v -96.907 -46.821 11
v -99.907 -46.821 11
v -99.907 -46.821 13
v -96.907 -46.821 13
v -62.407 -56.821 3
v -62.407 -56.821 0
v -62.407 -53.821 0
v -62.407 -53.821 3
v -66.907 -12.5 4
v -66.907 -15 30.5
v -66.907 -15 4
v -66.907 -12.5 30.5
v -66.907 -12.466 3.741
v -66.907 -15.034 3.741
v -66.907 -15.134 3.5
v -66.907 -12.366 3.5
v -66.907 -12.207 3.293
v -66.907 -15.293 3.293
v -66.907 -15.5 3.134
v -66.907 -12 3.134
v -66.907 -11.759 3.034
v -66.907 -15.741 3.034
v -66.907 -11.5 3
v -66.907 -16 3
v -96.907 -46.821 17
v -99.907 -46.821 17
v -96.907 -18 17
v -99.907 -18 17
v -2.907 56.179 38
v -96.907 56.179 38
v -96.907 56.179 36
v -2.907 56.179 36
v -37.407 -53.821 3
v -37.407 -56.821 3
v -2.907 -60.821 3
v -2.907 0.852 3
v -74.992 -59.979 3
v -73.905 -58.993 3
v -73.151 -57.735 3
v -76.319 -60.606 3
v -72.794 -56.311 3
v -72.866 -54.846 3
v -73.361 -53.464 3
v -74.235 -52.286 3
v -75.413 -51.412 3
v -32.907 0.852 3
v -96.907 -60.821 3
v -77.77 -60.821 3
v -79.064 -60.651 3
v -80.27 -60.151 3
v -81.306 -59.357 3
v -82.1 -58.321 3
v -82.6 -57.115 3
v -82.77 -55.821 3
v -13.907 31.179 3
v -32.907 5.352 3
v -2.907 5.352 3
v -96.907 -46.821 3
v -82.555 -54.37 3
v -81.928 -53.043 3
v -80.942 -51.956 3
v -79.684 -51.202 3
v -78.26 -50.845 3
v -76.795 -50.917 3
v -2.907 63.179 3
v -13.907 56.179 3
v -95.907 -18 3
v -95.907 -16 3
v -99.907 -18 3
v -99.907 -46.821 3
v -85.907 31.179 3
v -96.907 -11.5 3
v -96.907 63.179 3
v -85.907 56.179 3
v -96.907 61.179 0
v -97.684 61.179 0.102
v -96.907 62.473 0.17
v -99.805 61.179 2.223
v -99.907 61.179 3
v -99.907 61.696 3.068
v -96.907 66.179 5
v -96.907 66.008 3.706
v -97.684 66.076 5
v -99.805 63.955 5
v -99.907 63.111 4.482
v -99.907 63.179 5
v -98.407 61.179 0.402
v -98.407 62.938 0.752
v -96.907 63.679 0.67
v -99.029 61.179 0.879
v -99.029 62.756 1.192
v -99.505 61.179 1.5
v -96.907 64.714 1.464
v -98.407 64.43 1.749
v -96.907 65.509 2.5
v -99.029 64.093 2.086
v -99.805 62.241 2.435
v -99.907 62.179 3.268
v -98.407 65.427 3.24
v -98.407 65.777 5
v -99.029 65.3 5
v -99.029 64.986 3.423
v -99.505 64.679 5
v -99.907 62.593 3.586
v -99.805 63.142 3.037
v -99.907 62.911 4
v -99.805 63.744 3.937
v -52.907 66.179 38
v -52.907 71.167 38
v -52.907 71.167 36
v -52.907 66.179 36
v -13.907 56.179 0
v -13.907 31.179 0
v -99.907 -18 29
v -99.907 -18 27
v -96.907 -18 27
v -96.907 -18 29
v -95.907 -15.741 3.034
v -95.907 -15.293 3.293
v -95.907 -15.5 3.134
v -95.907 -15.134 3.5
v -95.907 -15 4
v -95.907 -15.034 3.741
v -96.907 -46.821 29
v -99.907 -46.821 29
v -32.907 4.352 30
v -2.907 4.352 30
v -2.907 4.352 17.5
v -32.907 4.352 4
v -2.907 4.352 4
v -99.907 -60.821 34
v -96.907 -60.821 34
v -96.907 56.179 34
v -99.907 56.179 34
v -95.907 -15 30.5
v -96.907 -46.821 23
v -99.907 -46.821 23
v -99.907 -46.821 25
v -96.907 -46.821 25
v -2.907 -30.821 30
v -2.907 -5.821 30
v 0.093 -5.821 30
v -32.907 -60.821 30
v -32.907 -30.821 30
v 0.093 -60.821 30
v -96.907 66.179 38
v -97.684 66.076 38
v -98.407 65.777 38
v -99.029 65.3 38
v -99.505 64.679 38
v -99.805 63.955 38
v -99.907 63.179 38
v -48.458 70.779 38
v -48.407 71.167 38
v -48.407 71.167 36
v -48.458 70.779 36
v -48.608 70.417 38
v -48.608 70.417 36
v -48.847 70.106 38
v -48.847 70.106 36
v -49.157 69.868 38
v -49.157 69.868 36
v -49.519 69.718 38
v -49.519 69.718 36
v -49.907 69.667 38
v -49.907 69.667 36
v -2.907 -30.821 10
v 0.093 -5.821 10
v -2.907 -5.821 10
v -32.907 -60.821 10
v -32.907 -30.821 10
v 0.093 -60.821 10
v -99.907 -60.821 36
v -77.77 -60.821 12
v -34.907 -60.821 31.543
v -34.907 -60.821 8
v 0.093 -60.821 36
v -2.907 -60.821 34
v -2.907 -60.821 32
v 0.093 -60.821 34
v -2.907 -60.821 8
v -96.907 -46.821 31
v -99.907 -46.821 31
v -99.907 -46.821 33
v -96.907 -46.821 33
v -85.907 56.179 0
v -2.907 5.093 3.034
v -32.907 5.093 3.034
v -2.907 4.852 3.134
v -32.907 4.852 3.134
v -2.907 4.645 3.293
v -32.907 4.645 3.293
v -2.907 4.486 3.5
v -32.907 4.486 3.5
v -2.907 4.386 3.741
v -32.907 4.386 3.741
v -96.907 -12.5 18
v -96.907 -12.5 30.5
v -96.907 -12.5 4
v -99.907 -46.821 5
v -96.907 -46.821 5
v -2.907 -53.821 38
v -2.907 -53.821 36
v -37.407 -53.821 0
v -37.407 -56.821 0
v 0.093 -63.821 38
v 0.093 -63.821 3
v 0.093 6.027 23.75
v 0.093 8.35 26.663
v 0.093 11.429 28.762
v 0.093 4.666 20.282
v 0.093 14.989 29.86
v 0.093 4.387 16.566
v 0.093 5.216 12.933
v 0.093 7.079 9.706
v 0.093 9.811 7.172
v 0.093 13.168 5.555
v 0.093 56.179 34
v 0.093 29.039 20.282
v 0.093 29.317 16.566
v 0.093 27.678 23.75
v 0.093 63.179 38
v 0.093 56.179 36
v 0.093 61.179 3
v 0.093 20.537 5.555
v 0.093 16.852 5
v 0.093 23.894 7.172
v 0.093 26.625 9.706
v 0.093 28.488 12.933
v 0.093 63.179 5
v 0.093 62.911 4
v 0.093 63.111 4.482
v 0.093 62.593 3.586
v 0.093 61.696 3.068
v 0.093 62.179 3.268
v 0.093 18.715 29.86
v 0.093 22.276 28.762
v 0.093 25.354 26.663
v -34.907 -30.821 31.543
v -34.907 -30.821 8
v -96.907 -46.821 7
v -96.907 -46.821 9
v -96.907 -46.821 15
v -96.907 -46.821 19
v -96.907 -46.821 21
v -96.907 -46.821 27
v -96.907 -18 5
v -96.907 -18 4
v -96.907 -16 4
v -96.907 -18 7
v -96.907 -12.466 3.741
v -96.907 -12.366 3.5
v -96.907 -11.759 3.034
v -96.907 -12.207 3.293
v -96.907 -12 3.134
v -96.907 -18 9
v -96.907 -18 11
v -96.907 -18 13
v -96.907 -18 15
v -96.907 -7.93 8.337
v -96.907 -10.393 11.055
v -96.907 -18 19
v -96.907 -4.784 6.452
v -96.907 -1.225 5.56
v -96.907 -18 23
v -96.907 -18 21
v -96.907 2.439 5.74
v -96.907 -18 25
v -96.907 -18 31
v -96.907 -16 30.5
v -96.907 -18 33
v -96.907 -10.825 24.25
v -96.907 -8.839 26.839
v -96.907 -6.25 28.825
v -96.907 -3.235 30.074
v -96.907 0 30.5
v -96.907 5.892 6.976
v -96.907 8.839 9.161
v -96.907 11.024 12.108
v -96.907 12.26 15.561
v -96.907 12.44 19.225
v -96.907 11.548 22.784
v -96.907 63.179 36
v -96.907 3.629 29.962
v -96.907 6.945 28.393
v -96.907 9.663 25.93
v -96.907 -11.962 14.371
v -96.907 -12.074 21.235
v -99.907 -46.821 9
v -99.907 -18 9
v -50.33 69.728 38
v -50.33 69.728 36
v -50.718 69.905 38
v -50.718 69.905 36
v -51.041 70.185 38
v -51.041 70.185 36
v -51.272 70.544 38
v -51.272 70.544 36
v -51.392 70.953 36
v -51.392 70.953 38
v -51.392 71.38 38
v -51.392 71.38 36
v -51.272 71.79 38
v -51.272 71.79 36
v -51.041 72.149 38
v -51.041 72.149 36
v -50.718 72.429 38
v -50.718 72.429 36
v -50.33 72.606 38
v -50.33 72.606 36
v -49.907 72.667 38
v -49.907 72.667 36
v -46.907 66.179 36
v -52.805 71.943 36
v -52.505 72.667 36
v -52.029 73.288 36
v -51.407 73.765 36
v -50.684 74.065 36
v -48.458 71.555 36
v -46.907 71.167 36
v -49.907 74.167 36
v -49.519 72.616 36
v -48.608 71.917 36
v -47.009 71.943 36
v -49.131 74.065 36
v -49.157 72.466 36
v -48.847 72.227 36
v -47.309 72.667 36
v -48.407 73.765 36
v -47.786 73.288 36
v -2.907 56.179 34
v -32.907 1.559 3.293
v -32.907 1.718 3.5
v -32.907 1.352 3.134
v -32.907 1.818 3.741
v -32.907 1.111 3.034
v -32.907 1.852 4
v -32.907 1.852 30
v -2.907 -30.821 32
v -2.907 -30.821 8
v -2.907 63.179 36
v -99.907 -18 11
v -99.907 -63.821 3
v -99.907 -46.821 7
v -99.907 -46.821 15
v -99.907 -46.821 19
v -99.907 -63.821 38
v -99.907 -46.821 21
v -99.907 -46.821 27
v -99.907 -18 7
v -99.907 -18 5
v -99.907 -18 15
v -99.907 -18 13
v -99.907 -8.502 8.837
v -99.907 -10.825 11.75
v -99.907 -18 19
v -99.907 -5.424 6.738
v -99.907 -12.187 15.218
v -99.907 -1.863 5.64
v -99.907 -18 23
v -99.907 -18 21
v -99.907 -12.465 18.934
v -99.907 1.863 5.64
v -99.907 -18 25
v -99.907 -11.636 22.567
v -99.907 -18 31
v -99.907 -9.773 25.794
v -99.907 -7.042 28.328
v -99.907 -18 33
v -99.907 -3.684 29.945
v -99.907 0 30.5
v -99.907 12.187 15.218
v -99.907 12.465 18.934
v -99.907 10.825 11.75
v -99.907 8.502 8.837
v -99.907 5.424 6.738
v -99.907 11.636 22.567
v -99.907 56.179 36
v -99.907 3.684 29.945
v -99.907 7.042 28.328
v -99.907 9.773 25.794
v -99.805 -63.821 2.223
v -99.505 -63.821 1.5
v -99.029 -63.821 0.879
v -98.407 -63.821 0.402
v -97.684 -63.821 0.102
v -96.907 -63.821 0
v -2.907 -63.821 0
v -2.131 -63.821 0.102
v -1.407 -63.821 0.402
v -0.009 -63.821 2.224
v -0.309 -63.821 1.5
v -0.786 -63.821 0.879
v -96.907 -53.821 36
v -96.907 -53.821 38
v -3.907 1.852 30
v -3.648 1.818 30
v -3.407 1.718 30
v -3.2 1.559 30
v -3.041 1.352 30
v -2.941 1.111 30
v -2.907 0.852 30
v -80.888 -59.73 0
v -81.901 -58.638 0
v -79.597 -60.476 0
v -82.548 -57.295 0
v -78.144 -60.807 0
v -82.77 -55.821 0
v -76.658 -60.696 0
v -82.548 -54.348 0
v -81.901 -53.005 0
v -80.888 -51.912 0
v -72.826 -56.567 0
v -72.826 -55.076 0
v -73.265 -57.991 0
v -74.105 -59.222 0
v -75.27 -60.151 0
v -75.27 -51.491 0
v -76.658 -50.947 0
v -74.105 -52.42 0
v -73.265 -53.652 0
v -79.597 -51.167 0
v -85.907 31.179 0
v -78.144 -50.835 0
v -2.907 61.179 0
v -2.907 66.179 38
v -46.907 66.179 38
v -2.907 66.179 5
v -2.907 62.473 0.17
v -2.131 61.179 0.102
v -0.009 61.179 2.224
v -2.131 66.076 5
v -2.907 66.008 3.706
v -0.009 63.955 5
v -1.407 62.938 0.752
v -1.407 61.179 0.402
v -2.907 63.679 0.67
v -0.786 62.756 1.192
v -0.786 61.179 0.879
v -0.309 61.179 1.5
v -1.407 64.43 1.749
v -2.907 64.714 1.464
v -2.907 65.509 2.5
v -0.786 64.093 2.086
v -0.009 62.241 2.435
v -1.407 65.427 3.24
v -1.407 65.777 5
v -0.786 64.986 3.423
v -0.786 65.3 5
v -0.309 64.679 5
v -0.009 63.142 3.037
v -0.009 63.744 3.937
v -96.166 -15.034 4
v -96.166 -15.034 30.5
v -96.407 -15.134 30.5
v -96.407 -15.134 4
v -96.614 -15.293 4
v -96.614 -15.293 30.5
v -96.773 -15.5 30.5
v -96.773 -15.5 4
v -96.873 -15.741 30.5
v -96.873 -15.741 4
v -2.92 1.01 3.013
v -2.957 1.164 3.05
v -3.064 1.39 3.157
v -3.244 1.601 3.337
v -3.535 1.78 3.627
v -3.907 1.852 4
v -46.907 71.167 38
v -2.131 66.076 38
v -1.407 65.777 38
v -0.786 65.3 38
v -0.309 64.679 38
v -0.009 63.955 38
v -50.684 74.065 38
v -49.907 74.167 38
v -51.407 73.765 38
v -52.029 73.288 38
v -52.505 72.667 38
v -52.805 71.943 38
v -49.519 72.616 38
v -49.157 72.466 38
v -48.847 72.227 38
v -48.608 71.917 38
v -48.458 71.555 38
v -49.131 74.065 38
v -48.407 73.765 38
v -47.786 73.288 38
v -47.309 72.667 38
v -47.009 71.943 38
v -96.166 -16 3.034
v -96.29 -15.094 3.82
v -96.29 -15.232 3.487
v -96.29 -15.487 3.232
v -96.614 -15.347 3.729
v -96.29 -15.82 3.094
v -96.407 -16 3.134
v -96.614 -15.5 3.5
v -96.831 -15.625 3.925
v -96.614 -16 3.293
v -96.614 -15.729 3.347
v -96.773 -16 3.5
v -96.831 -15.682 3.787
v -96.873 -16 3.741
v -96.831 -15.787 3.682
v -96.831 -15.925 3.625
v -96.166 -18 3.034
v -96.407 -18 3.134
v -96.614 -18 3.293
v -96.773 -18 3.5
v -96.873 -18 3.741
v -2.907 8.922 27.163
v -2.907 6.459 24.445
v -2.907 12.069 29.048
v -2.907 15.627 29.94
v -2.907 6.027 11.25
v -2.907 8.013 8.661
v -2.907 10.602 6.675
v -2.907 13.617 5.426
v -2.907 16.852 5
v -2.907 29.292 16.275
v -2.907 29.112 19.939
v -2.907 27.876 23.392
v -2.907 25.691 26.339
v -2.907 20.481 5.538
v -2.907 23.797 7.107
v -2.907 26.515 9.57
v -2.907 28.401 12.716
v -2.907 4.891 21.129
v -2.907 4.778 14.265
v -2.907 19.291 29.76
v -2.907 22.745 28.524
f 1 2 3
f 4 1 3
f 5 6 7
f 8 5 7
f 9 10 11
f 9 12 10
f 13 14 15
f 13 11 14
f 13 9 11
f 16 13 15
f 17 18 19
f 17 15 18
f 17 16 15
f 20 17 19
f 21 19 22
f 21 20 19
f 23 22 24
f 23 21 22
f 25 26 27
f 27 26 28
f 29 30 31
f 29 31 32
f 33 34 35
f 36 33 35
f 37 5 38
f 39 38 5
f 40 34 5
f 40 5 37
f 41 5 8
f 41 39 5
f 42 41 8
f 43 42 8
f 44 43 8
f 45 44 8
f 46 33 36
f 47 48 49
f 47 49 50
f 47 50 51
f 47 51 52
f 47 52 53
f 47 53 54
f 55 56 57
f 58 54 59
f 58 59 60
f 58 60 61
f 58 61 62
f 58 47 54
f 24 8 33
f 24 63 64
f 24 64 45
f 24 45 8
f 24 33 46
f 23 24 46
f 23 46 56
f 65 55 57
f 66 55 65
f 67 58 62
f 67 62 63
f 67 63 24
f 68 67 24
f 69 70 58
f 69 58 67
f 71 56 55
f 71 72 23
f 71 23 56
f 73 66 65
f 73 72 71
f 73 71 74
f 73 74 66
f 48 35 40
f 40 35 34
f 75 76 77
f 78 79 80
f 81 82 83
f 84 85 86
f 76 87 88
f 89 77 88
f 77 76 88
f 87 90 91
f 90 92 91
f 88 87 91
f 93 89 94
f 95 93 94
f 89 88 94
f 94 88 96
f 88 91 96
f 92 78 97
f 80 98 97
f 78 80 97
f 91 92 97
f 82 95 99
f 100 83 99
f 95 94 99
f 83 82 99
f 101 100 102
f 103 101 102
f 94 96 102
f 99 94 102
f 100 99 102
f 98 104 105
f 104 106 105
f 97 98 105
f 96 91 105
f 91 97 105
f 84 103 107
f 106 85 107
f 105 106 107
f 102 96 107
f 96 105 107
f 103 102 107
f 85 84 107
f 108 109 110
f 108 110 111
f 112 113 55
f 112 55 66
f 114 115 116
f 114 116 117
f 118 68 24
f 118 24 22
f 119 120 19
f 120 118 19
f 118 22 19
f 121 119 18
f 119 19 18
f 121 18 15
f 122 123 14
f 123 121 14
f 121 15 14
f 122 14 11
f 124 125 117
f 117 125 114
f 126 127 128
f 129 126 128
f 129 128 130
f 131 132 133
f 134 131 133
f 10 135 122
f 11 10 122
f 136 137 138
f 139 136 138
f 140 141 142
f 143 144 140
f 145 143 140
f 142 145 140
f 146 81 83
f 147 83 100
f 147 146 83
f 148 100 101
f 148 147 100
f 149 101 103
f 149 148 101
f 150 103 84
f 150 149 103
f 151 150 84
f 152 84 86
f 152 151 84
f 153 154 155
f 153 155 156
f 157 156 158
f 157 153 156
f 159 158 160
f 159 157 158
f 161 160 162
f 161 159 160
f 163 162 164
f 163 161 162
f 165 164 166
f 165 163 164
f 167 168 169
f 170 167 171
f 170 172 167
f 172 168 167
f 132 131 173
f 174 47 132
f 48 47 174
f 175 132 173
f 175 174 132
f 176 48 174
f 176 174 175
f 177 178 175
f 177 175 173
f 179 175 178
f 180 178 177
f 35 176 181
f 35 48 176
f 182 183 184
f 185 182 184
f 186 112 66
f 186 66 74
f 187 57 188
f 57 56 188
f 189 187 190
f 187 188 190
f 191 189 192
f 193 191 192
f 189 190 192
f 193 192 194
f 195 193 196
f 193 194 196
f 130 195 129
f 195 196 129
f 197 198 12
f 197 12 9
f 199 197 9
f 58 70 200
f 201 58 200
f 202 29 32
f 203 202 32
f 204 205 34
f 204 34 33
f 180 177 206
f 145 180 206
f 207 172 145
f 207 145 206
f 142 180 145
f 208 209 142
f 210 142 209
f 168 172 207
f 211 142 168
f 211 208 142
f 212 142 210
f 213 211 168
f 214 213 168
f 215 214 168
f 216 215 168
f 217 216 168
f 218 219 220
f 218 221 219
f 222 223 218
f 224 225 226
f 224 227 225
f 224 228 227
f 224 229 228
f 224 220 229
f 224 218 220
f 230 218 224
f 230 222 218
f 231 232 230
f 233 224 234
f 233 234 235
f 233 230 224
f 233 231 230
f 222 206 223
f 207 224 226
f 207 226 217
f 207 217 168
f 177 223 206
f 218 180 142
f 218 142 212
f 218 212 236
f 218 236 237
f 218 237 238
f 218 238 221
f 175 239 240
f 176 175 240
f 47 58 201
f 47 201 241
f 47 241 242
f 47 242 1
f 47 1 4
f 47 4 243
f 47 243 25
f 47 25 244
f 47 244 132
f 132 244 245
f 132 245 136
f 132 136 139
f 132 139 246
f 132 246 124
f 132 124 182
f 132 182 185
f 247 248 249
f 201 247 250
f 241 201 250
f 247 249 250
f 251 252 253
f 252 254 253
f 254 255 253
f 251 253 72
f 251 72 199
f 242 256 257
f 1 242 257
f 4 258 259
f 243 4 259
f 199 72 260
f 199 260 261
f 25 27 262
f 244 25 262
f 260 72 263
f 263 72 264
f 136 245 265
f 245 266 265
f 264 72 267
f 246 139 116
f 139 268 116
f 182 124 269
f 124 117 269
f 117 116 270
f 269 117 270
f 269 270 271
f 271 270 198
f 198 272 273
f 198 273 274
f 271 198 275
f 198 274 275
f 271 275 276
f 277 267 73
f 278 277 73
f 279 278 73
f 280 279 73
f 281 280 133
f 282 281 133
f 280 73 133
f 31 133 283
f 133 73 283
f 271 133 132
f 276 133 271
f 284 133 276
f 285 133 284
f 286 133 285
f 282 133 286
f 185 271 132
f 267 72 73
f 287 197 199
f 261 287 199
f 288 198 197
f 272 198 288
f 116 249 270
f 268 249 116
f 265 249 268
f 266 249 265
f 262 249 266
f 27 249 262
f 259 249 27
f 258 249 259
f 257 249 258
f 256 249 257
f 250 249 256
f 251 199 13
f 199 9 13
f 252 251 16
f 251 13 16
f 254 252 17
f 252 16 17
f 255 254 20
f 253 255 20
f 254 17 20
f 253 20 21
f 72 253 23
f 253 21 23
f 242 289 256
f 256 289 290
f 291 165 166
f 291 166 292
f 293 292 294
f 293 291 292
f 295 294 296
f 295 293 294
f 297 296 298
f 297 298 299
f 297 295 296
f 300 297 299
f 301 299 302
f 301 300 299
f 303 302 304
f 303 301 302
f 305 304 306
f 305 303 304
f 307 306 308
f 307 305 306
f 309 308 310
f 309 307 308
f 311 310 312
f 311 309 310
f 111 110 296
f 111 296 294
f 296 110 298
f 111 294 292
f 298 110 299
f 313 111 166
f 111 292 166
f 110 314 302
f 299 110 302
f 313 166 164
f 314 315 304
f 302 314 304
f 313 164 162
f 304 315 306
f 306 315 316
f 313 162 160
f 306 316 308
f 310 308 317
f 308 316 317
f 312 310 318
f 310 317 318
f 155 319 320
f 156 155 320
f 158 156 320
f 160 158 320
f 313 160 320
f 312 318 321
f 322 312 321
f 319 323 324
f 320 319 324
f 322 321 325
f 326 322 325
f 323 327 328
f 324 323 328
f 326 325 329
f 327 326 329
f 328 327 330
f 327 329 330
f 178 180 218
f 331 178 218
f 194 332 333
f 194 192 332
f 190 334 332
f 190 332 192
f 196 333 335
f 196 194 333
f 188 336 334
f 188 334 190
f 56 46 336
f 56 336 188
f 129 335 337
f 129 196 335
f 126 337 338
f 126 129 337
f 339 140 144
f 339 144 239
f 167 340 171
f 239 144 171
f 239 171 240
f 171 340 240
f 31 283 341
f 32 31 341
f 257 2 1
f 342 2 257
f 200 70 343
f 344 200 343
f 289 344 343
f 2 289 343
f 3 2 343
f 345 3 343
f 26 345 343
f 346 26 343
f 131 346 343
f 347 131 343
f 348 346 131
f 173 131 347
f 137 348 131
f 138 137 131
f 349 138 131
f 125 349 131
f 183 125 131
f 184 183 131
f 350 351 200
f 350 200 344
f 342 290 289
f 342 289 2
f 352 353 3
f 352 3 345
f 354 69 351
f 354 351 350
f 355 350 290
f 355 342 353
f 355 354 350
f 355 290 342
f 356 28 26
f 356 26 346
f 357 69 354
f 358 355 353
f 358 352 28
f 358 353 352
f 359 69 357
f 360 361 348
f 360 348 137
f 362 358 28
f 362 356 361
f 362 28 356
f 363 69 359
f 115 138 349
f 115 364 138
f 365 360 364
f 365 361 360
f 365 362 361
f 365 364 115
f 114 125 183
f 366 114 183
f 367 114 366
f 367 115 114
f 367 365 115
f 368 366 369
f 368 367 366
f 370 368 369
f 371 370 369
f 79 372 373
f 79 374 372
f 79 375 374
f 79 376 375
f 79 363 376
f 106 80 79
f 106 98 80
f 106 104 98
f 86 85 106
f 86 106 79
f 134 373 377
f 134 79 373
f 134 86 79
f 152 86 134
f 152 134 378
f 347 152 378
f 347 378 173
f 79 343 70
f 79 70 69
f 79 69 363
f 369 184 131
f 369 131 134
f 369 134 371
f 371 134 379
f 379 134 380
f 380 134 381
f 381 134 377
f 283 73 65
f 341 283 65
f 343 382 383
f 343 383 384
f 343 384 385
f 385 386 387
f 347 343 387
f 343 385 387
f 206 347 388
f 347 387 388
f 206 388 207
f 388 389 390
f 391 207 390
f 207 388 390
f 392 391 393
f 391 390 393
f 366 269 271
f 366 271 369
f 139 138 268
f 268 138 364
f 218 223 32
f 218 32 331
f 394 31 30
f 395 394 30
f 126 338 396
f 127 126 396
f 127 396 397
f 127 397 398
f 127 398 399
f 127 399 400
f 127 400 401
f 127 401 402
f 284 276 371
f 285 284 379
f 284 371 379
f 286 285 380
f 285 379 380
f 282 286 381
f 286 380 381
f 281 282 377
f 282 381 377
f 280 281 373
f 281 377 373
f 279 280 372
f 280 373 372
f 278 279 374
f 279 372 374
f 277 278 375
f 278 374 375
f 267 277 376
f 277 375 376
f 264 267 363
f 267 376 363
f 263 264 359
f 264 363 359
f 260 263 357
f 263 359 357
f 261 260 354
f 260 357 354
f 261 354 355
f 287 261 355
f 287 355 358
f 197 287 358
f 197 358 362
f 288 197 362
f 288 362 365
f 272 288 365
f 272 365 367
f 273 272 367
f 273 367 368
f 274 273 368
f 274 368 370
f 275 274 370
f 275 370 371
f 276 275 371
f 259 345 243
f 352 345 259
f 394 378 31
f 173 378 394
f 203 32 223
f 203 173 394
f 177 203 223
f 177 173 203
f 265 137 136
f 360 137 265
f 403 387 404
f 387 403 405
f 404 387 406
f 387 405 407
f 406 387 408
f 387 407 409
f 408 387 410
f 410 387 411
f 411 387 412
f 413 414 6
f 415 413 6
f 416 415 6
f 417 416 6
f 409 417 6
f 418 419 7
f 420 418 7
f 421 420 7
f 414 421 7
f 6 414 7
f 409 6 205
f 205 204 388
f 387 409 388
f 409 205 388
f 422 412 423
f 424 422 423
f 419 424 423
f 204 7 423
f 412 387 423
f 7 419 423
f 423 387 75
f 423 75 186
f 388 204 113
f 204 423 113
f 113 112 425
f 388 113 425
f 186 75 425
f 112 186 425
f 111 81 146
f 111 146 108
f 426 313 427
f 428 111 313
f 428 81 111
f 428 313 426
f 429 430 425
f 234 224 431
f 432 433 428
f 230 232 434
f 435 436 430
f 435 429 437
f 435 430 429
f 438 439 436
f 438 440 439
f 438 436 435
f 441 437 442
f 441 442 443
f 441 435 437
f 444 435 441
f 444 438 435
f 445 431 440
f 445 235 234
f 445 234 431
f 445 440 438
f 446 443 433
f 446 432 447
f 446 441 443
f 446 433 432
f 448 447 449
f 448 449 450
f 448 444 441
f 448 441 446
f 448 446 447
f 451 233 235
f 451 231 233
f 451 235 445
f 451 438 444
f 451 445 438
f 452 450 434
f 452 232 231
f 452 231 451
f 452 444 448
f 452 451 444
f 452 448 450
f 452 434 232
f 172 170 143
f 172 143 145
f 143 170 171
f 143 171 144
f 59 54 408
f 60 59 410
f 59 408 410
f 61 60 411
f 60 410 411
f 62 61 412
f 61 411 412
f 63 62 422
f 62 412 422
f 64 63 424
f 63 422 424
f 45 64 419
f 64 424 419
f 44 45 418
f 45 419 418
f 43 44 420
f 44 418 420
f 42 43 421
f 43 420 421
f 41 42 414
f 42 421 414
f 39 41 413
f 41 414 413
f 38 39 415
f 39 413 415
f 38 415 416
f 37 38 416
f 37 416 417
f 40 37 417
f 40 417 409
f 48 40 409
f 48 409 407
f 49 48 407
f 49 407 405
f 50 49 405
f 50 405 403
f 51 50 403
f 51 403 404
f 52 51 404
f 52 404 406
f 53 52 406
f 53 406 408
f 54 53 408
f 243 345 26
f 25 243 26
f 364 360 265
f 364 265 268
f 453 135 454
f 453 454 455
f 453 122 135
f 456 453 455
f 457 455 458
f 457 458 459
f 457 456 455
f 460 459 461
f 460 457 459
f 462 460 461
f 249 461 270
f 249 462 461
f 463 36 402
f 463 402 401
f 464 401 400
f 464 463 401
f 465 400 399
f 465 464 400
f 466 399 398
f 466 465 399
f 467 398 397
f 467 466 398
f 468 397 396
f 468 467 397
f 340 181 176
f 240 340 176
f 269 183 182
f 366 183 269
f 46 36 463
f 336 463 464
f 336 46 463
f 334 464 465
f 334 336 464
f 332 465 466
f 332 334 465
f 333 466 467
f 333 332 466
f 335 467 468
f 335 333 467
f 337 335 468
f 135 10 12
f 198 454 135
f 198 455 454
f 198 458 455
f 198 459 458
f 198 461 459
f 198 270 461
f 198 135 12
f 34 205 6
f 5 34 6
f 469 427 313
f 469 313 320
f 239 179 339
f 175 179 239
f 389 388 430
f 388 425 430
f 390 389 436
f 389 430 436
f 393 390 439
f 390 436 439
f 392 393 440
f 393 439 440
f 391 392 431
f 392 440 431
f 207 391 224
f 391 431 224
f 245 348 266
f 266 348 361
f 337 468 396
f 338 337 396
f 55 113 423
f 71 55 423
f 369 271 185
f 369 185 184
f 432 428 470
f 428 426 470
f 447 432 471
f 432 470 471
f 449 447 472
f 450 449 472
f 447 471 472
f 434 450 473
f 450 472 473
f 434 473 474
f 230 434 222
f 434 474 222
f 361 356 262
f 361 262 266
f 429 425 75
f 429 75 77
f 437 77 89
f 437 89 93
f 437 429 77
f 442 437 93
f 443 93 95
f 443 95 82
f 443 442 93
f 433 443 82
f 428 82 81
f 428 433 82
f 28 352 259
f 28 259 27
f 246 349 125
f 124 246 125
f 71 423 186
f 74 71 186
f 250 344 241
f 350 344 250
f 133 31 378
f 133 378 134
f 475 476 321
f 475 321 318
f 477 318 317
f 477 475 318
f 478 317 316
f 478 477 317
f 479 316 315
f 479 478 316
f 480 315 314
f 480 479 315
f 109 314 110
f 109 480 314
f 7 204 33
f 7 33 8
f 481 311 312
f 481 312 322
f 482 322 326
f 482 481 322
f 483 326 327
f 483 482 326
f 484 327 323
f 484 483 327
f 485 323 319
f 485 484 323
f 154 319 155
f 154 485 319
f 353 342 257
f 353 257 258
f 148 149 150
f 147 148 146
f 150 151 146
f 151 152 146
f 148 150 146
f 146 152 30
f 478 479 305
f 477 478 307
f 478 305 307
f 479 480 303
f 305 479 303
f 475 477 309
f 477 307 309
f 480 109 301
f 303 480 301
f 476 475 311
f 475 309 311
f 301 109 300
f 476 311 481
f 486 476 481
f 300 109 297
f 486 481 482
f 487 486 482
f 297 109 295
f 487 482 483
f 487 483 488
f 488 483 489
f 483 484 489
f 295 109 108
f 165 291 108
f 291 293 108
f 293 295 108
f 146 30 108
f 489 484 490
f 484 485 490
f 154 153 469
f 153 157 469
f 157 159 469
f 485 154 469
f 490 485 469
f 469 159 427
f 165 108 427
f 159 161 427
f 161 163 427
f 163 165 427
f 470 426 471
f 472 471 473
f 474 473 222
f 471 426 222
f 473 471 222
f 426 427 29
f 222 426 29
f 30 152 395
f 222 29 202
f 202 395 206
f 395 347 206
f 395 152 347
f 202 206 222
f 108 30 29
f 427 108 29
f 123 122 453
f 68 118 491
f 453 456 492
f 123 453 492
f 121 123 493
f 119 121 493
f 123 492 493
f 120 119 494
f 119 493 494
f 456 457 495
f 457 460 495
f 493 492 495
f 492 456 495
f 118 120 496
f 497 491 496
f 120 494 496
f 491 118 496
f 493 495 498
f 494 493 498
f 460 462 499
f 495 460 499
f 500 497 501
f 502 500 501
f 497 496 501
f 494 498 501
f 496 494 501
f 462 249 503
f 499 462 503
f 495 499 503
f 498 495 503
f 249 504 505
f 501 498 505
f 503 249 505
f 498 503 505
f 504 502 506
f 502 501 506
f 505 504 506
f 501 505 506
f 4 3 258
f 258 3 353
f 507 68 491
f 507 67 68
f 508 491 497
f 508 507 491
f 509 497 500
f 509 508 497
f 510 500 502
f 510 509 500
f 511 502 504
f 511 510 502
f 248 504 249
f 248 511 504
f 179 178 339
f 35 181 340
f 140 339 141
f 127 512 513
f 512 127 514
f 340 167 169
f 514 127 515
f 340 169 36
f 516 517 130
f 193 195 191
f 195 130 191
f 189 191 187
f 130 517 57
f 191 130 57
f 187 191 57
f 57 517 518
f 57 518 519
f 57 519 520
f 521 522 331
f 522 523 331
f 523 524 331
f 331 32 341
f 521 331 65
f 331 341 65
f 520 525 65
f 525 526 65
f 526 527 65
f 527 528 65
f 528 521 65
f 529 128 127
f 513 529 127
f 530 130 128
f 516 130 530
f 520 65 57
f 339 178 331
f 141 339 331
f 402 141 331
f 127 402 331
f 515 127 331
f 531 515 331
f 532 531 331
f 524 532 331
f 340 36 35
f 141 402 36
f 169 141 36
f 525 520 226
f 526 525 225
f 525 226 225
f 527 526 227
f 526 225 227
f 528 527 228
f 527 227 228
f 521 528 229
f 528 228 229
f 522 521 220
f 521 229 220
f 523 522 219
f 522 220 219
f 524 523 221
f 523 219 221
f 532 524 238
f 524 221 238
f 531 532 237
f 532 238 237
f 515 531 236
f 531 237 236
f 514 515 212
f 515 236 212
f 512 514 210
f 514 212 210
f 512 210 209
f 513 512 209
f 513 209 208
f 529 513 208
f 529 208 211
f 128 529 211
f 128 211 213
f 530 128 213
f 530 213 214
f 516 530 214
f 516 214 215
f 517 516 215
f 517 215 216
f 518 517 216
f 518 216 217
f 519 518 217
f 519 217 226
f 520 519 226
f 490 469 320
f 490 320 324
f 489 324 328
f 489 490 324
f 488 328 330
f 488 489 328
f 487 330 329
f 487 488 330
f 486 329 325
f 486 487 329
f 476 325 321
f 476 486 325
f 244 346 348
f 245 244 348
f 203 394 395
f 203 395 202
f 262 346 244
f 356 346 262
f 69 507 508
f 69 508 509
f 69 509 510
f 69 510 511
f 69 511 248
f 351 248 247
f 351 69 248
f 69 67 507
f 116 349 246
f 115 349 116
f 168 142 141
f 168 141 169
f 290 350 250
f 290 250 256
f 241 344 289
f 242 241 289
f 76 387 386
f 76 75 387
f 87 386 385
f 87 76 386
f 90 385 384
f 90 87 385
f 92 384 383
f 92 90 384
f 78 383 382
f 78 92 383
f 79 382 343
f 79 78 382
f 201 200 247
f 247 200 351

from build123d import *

# Parameters (mm, degrees)
IZIM1_W                      = 100
IZIM1_H                      = 130
Y_KSEKLIK_EKSTR_ZYON1_DEPTH  = 35
IZIM2_W                      = 94
IZIM2_H                      = 124
KES_EKSTR_ZYON1_DEPTH        = 27
IZIM3_W                      = 72
IZIM3_H                      = 25
KES_EKSTR_ZYON2_DEPTH        = 27
IZIM4_W                      = 25
IZIM4_H                      = 3
KES_EKSTR_ZYON3_DEPTH        = 27
IZIM7_W                      = 20
IZIM7_H                      = 55
KES_EKSTR_ZYON5_DEPTH        = 27
IZIM8_R                      = 12.5
KES_EKSTR_ZYON7_DEPTH        = 27
IZIM9_R                      = 12.5
KES_EKSTR_ZYON8_DEPTH        = 27
IZIM12_W                     = 94
IZIM12_H                     = 124
KES_EKSTR_ZYON9_DEPTH        = 5
IZIM13_W                     = 28.453191741
IZIM13_H                     = 38.236186197
Y_KSEKLIK_EKSTR_ZYON2_DEPTH  = 3
IZIM14_R                     = 12.5
KES_EKSTR_ZYON10_DEPTH       = 12
IZIM15_R                     = 5
KES_EKSTR_ZYON12_DEPTH       = 12
IZIM16_W                     = 29
IZIM16_H                     = 28.82133995
KES_EKSTR_ZYON13_DEPTH       = 12
IZIM17_W                     = 2
IZIM17_H                     = 28.82133995
Y_KSEKLIK_EKSTR_ZYON3_DEPTH  = 3
IZIM18_W                     = 3
IZIM18_H                     = 28.82133995
KES_EKSTR_ZYON14_DEPTH       = 1
IZIM20_W                     = 3
IZIM20_H                     = 130
Y_KSEKLIK_EKSTR_ZYON4_DEPTH  = 3
IZIM21_W                     = 3
IZIM21_H                     = 130
Y_KSEKLIK_EKSTR_ZYON5_DEPTH  = 3
IZIM22_W                     = 94
IZIM22_H                     = 3
Y_KSEKLIK_EKSTR_ZYON6_DEPTH  = 3
IZIM23_W                     = 94
IZIM23_H                     = 3
Y_KSEKLIK_EKSTR_ZYON8_DEPTH  = 3
IZIM24_W                     = 94
IZIM24_H                     = 2
Y_KSEKLIK_EKSTR_ZYON9_DEPTH  = 7
IZIM25_W                     = 94
IZIM25_H                     = 2
Y_KSEKLIK_EKSTR_ZYON10_DEPTH = 7
IZIM28_W                     = 2
IZIM28_H                     = 117
KES_EKSTR_ZYON16_DEPTH       = 119
Y_KSEKLIK_EKSTR_ZYON13_DEPTH = 2
Y_KSEKLIK_EKSTR_ZYON14_DEPTH = 30
Y_KSEKLIK_EKSTR_ZYON16_DEPTH = 30
IZIM33_W                     = 27.5
IZIM33_H                     = 2.5
Y_KSEKLIK_EKSTR_ZYON17_DEPTH = 30
RADYUS2_R                    = 1
RADYUS3_R                    = 1
RADYUS4_R                    = 5
RADYUS5_R                    = 3
RADYUS6_R                    = 3
RADYUS7_R                    = 1
RADYUS8_R                    = 1
RADYUS9_R                    = 1
RADYUS12_R                   = 1


# Some blends are built 0.0001 mm under size
with BuildPart() as part:
    # Çizim1 → Yükseklik-Ekstrüzyon1 (new body)
    with BuildSketch(Plane.XY):
        with Locations((-49.907227327, 1.17866005)):
            Rectangle(IZIM1_W, IZIM1_H)
    extrude(amount=Y_KSEKLIK_EKSTR_ZYON1_DEPTH)

    # Çizim2 → Kes-Ekstrüzyon1 (cut)
    with BuildSketch(Plane.XY.offset(35)):
        with Locations((-49.907227327, 1.17866005)):
            Rectangle(IZIM2_W, IZIM2_H)
    extrude(amount=-KES_EKSTR_ZYON1_DEPTH, mode=Mode.SUBTRACT)

    # Çizim3 → Kes-Ekstrüzyon2 (cut)
    with BuildSketch(Plane(origin=(0, 0, 0), x_dir=(-1, 0, 0), z_dir=(0, 0, -1))):
        with Locations((49.907227327, 43.67866005)):
            Rectangle(IZIM3_W, IZIM3_H)
    extrude(amount=-KES_EKSTR_ZYON2_DEPTH, mode=Mode.SUBTRACT)

    # Çizim4 → Kes-Ekstrüzyon3 (cut)
    with BuildSketch(Plane(origin=(0, 0, 0), x_dir=(-1, 0, 0), z_dir=(0, 0, -1))):
        with Locations((49.907227327, -55.32133995)):
            Rectangle(IZIM4_W, IZIM4_H)
    extrude(amount=-KES_EKSTR_ZYON3_DEPTH, mode=Mode.SUBTRACT)

    # Çizim7 → Kes-Ekstrüzyon5 (cut)
    with BuildSketch(Plane(origin=(0.092772673, 0, 0), x_dir=(0, 0, -1), z_dir=(1, 0, 0))):
        with Locations((-20, -33.32133995)):
            Rectangle(IZIM7_W, IZIM7_H)
    extrude(amount=-KES_EKSTR_ZYON5_DEPTH, mode=Mode.SUBTRACT)

    # Çizim8 → Kes-Ekstrüzyon7 (cut)
    with BuildSketch(Plane.ZY.offset(99.907227327)):
        with Locations((18, 0)):
            Circle(IZIM8_R)
    extrude(amount=-KES_EKSTR_ZYON7_DEPTH, mode=Mode.SUBTRACT)

    # Çizim9 → Kes-Ekstrüzyon8 (cut)
    with BuildSketch(Plane(origin=(0.092772673, 0, 0), x_dir=(0, 0, -1), z_dir=(1, 0, 0))):
        with Locations((-21.5, 19.418739017)):
            Circle(IZIM9_R)
    extrude(amount=-KES_EKSTR_ZYON8_DEPTH, mode=Mode.SUBTRACT)

    # Çizim12 → Kes-Ekstrüzyon9 (cut)
    with BuildSketch(Plane.XY.offset(8)):
        with Locations((-49.907227327, 1.17866005)):
            Rectangle(IZIM12_W, IZIM12_H)
    extrude(amount=-KES_EKSTR_ZYON9_DEPTH, mode=Mode.SUBTRACT)

    # Çizim13 → Yükseklik-Ekstrüzyon2 (add)
    with BuildSketch(Plane(origin=(0.092772673, 0, 0), x_dir=(0, 0, -1), z_dir=(1, 0, 0))):
        with Locations((-20.77340413, 20.296753148)):
            Rectangle(IZIM13_W, IZIM13_H)
    extrude(amount=-Y_KSEKLIK_EKSTR_ZYON2_DEPTH)

    # Çizim14 → Kes-Ekstrüzyon10 (cut)
    with BuildSketch(Plane(origin=(0.092772673, 0, 0), x_dir=(0, 0, -1), z_dir=(1, 0, 0))):
        with Locations((-17.5, 16.852295745)):
            Circle(IZIM14_R)
    extrude(amount=-KES_EKSTR_ZYON10_DEPTH, mode=Mode.SUBTRACT)

    # Çizim15 → Kes-Ekstrüzyon12 (cut)
    with BuildSketch(Plane(origin=(0, 0, 0), x_dir=(-1, 0, 0), z_dir=(0, 0, -1))):
        with Locations((77.770167632, -55.82133995)):
            Circle(IZIM15_R)
    extrude(amount=-KES_EKSTR_ZYON12_DEPTH, mode=Mode.SUBTRACT)

    # Çizim16 → Kes-Ekstrüzyon13 (cut)
    with BuildSketch(Plane.ZY.offset(99.907227327)):
        with Locations((17.5, -32.410669975)):
            Rectangle(IZIM16_W, IZIM16_H)
    extrude(amount=-KES_EKSTR_ZYON13_DEPTH, mode=Mode.SUBTRACT)

    # Çizim17 → Yükseklik-Ekstrüzyon3 (add)
    with BuildSketch(Plane.ZY.offset(99.907227327)):
        with Locations((6, -32.410669975)):
            Rectangle(IZIM17_W, IZIM17_H)
        with Locations((10, -32.410669975)):
            Rectangle(IZIM17_W, IZIM17_H)
        with Locations((14, -32.410669975)):
            Rectangle(IZIM17_W, IZIM17_H)
        with Locations((18, -32.410669975)):
            Rectangle(IZIM17_W, IZIM17_H)
        with Locations((22, -32.410669975)):
            Rectangle(IZIM17_W, IZIM17_H)
        with Locations((26, -32.410669975)):
            Rectangle(IZIM17_W, IZIM17_H)
        with Locations((30, -32.410669975)):
            Rectangle(IZIM17_W, IZIM17_H)
    extrude(amount=-Y_KSEKLIK_EKSTR_ZYON3_DEPTH)

    # Çizim18 → Kes-Ekstrüzyon14 (cut)
    with BuildSketch(Plane(origin=(0, 0, 32), x_dir=(-1, 0, 0), z_dir=(0, 0, -1))):
        with Locations((98.407227327, -32.410669975)):
            Rectangle(IZIM18_W, IZIM18_H)
    extrude(amount=-KES_EKSTR_ZYON14_DEPTH, mode=Mode.SUBTRACT)

    # Çizim20 → Yükseklik-Ekstrüzyon4 (add)
    with BuildSketch(Plane.ZY.offset(99.907227327)):
        with Locations((36.5, 1.17866005)):
            Rectangle(IZIM20_W, IZIM20_H)
    extrude(amount=-Y_KSEKLIK_EKSTR_ZYON4_DEPTH)

    # Çizim21 → Yükseklik-Ekstrüzyon5 (add)
    with BuildSketch(Plane(origin=(0.092772673, 0, 0), x_dir=(0, 0, -1), z_dir=(1, 0, 0))):
        with Locations((-36.5, 1.17866005)):
            Rectangle(IZIM21_W, IZIM21_H)
    extrude(amount=-Y_KSEKLIK_EKSTR_ZYON5_DEPTH)

    # Çizim22 → Yükseklik-Ekstrüzyon6 (add)
    with BuildSketch(Plane(origin=(0, 66.17866005, 0), x_dir=(1, 0, 0), z_dir=(0, 1, 0))):
        with Locations((-49.907227327, -36.5)):
            Rectangle(IZIM22_W, IZIM22_H)
    extrude(amount=-Y_KSEKLIK_EKSTR_ZYON6_DEPTH)

    # Çizim23 → Yükseklik-Ekstrüzyon8 (add)
    with BuildSketch(Plane(origin=(0, -60.82133995, 0), x_dir=(1, 0, 0), z_dir=(0, 1, 0))):
        with Locations((-49.907227327, -36.5)):
            Rectangle(IZIM23_W, IZIM23_H)
    extrude(amount=-Y_KSEKLIK_EKSTR_ZYON8_DEPTH)

    # Çizim24 → Yükseklik-Ekstrüzyon9 (add)
    with BuildSketch(Plane.XZ.offset(-63.17866005)):
        with Locations((-49.907227327, 37)):
            Rectangle(IZIM24_W, IZIM24_H)
    extrude(amount=Y_KSEKLIK_EKSTR_ZYON9_DEPTH)

    # Çizim25 → Yükseklik-Ekstrüzyon10 (add)
    with BuildSketch(Plane(origin=(0, -60.82133995, 0), x_dir=(1, 0, 0), z_dir=(0, 1, 0))):
        with Locations((-49.907227327, -37)):
            Rectangle(IZIM25_W, IZIM25_H)
    extrude(amount=Y_KSEKLIK_EKSTR_ZYON10_DEPTH)

    # Çizim28 → Kes-Ekstrüzyon16 (cut)
    with BuildSketch(Plane(origin=(0.092772673, 0, 0), x_dir=(0, 0, -1), z_dir=(1, 0, 0))):
        with Locations((-35, -2.32133995)):
            Rectangle(IZIM28_W, IZIM28_H)
    extrude(amount=-KES_EKSTR_ZYON16_DEPTH, mode=Mode.SUBTRACT)

    # Çizim30 → Yükseklik-Ekstrüzyon13 (add)
    with BuildSketch(Plane.XY.offset(38)):
        with BuildLine():
            Line((-52.907227327, 66.17866005), (-49.907227327, 66.17866005))
            Line((-49.907227327, 66.17866005), (-49.907227327, 68.166838309))
            ThreePointArc((-49.907227327, 68.166838309), (-52.02854767, 69.045517966), (-52.907227327, 71.166838309))
            Line((-52.907227327, 71.166838309), (-52.907227327, 66.17866005))
        make_face()
        with BuildLine():
            Line((-49.907227327, 68.166838309), (-49.907227327, 66.17866005))
            Line((-49.907227327, 66.17866005), (-46.907227327, 66.17866005))
            Line((-46.907227327, 66.17866005), (-46.907227327, 71.166838309))
            ThreePointArc((-46.907227327, 71.166838309), (-47.785906983, 69.045517966), (-49.907227327, 68.166838309))
        make_face()
        with BuildLine():
            ThreePointArc((-52.907227327, 71.166838309), (-52.02854767, 69.045517966), (-49.907227327, 68.166838309))
            Line((-49.907227327, 68.166838309), (-49.907227327, 69.666838309))
            ThreePointArc((-49.907227327, 69.666838309), (-51.407227327, 71.166838309), (-49.907227327, 72.666838309))
            Line((-49.907227327, 72.666838309), (-49.907227327, 74.166838309))
            ThreePointArc((-49.907227327, 74.166838309), (-52.02854767, 73.288158653), (-52.907227327, 71.166838309))
        make_face()
        with BuildLine():
            Line((-49.907227327, 69.666838309), (-49.907227327, 68.166838309))
            ThreePointArc((-49.907227327, 68.166838309), (-47.785906983, 69.045517966), (-46.907227327, 71.166838309))
            ThreePointArc((-46.907227327, 71.166838309), (-47.785906983, 73.288158653), (-49.907227327, 74.166838309))
            Line((-49.907227327, 74.166838309), (-49.907227327, 72.666838309))
            ThreePointArc((-49.907227327, 72.666838309), (-48.846567155, 72.227498481), (-48.407227327, 71.166838309))
            ThreePointArc((-48.407227327, 71.166838309), (-48.846567155, 70.106178138), (-49.907227327, 69.666838309))
        make_face()
    extrude(amount=-Y_KSEKLIK_EKSTR_ZYON13_DEPTH)

    # Çizim31 → Yükseklik-Ekstrüzyon14 (add)
    with BuildSketch(Plane(origin=(0, -60.82133995, 0), x_dir=(1, 0, 0), z_dir=(0, 1, 0))):
        Polygon((-32.907227327, -10), (-32.907227327, -30), (-2.907227327, -30), (-2.907227327, -32), (-34.907227327, -31.543172405), (-34.907227327, -8), (-32.907227327, -8), (-2.907227327, -8), (-2.907227327, -10), align=None)
    extrude(amount=Y_KSEKLIK_EKSTR_ZYON14_DEPTH)

    # Çizim32 → Yükseklik-Ekstrüzyon16 (add)
    with BuildSketch(Plane.ZY.offset(2.907227327)):
        Polygon((30, 4.352295745), (5, 4.352295745), (3, 4.352295745), (3, 1.852295745), (5, 1.852295745), (30, 1.852295745), align=None)
    extrude(amount=Y_KSEKLIK_EKSTR_ZYON16_DEPTH)

    # Çizim33 → Yükseklik-Ekstrüzyon17 (add)
    with BuildSketch(Plane(origin=(-96.907227327, 0, 0), x_dir=(0, 0, -1), z_dir=(1, 0, 0))):
        with Locations((-16.75, -13.75)):
            Rectangle(IZIM33_W, IZIM33_H)
    extrude(amount=Y_KSEKLIK_EKSTR_ZYON17_DEPTH)

    # Radyus2
    radyus2_edges = [part.edges().sort_by_distance(p)[0] for p in [
        (-81.907227327, -12.5, 3),
    ]]
    fillet(radyus2_edges, radius=RADYUS2_R)

    # Radyus3
    radyus3_edges = [part.edges().sort_by_distance(p)[0] for p in [
        (-17.907227327, 4.352295745, 3),
    ]]
    fillet(radyus3_edges, radius=RADYUS3_R)

    # Radyus4
    radyus4_edges = [part.edges().sort_by_distance(p)[0] for p in [
        (-49.907227327, 66.17866005, 0),
    ]]
    fillet(radyus4_edges, radius=RADYUS4_R)

    # Radyus5
    radyus5_edges = [part.edges().sort_by_distance(p)[0] for p in [
        (0.092772673, -1.32133995, 0),
        (0.092772673, 64.714193956, 1.464466094),
        (0.092772673, 66.17866005, 21.5),
    ]]
    fillet(radyus5_edges, radius=RADYUS5_R)

    # Radyus6
    radyus6_edges = [part.edges().sort_by_distance(p)[0] for p in [
        (-99.907227327, -1.32133995, 0),
        (-99.907227327, 64.714193956, 1.464466094),
        (-99.907227327, 66.17866005, 21.5),
    ]]
    fillet(radyus6_edges, radius=RADYUS6_R - 0.0001)  # a hair under: the kernel refuses the full size

    # Radyus7
    radyus7_edges = [part.edges().sort_by_distance(p)[0] for p in [
        (-17.907227327, 1.852295745, 3),
    ]]
    fillet(radyus7_edges, radius=RADYUS7_R)

    # Radyus8
    radyus8_edges = [part.edges().sort_by_distance(p)[0] for p in [
        (-81.907227327, -15, 3),
    ]]
    fillet(radyus8_edges, radius=RADYUS8_R)

    # Radyus9
    radyus9_edges = [part.edges().sort_by_distance(p)[0] for p in [
        (-96.907227327, -15, 17.25),
        (-96.907227327, -17, 3),
        (-96.907227327, -15.292893219, 3.292893219),
    ]]
    fillet(radyus9_edges, radius=RADYUS9_R)

    # Radyus12
    # the kernel refuses this fillet: 1 mm, written as the material it adds along each edge
    with BuildSketch(Plane(origin=(-2.907227327, 1.852295745, 1.5), x_dir=(-1, 0, 0), z_dir=(0, 0, 1))) as radyus12_piece_1:
        with BuildLine():
            CenterArc((RADYUS12_R, RADYUS12_R), RADYUS12_R, 180, 90)
            Line((0, RADYUS12_R), (0, 0))
            Line((0, 0), (RADYUS12_R, 0))
        make_face()
    extrude(amount=28.5)


solid = part.part
